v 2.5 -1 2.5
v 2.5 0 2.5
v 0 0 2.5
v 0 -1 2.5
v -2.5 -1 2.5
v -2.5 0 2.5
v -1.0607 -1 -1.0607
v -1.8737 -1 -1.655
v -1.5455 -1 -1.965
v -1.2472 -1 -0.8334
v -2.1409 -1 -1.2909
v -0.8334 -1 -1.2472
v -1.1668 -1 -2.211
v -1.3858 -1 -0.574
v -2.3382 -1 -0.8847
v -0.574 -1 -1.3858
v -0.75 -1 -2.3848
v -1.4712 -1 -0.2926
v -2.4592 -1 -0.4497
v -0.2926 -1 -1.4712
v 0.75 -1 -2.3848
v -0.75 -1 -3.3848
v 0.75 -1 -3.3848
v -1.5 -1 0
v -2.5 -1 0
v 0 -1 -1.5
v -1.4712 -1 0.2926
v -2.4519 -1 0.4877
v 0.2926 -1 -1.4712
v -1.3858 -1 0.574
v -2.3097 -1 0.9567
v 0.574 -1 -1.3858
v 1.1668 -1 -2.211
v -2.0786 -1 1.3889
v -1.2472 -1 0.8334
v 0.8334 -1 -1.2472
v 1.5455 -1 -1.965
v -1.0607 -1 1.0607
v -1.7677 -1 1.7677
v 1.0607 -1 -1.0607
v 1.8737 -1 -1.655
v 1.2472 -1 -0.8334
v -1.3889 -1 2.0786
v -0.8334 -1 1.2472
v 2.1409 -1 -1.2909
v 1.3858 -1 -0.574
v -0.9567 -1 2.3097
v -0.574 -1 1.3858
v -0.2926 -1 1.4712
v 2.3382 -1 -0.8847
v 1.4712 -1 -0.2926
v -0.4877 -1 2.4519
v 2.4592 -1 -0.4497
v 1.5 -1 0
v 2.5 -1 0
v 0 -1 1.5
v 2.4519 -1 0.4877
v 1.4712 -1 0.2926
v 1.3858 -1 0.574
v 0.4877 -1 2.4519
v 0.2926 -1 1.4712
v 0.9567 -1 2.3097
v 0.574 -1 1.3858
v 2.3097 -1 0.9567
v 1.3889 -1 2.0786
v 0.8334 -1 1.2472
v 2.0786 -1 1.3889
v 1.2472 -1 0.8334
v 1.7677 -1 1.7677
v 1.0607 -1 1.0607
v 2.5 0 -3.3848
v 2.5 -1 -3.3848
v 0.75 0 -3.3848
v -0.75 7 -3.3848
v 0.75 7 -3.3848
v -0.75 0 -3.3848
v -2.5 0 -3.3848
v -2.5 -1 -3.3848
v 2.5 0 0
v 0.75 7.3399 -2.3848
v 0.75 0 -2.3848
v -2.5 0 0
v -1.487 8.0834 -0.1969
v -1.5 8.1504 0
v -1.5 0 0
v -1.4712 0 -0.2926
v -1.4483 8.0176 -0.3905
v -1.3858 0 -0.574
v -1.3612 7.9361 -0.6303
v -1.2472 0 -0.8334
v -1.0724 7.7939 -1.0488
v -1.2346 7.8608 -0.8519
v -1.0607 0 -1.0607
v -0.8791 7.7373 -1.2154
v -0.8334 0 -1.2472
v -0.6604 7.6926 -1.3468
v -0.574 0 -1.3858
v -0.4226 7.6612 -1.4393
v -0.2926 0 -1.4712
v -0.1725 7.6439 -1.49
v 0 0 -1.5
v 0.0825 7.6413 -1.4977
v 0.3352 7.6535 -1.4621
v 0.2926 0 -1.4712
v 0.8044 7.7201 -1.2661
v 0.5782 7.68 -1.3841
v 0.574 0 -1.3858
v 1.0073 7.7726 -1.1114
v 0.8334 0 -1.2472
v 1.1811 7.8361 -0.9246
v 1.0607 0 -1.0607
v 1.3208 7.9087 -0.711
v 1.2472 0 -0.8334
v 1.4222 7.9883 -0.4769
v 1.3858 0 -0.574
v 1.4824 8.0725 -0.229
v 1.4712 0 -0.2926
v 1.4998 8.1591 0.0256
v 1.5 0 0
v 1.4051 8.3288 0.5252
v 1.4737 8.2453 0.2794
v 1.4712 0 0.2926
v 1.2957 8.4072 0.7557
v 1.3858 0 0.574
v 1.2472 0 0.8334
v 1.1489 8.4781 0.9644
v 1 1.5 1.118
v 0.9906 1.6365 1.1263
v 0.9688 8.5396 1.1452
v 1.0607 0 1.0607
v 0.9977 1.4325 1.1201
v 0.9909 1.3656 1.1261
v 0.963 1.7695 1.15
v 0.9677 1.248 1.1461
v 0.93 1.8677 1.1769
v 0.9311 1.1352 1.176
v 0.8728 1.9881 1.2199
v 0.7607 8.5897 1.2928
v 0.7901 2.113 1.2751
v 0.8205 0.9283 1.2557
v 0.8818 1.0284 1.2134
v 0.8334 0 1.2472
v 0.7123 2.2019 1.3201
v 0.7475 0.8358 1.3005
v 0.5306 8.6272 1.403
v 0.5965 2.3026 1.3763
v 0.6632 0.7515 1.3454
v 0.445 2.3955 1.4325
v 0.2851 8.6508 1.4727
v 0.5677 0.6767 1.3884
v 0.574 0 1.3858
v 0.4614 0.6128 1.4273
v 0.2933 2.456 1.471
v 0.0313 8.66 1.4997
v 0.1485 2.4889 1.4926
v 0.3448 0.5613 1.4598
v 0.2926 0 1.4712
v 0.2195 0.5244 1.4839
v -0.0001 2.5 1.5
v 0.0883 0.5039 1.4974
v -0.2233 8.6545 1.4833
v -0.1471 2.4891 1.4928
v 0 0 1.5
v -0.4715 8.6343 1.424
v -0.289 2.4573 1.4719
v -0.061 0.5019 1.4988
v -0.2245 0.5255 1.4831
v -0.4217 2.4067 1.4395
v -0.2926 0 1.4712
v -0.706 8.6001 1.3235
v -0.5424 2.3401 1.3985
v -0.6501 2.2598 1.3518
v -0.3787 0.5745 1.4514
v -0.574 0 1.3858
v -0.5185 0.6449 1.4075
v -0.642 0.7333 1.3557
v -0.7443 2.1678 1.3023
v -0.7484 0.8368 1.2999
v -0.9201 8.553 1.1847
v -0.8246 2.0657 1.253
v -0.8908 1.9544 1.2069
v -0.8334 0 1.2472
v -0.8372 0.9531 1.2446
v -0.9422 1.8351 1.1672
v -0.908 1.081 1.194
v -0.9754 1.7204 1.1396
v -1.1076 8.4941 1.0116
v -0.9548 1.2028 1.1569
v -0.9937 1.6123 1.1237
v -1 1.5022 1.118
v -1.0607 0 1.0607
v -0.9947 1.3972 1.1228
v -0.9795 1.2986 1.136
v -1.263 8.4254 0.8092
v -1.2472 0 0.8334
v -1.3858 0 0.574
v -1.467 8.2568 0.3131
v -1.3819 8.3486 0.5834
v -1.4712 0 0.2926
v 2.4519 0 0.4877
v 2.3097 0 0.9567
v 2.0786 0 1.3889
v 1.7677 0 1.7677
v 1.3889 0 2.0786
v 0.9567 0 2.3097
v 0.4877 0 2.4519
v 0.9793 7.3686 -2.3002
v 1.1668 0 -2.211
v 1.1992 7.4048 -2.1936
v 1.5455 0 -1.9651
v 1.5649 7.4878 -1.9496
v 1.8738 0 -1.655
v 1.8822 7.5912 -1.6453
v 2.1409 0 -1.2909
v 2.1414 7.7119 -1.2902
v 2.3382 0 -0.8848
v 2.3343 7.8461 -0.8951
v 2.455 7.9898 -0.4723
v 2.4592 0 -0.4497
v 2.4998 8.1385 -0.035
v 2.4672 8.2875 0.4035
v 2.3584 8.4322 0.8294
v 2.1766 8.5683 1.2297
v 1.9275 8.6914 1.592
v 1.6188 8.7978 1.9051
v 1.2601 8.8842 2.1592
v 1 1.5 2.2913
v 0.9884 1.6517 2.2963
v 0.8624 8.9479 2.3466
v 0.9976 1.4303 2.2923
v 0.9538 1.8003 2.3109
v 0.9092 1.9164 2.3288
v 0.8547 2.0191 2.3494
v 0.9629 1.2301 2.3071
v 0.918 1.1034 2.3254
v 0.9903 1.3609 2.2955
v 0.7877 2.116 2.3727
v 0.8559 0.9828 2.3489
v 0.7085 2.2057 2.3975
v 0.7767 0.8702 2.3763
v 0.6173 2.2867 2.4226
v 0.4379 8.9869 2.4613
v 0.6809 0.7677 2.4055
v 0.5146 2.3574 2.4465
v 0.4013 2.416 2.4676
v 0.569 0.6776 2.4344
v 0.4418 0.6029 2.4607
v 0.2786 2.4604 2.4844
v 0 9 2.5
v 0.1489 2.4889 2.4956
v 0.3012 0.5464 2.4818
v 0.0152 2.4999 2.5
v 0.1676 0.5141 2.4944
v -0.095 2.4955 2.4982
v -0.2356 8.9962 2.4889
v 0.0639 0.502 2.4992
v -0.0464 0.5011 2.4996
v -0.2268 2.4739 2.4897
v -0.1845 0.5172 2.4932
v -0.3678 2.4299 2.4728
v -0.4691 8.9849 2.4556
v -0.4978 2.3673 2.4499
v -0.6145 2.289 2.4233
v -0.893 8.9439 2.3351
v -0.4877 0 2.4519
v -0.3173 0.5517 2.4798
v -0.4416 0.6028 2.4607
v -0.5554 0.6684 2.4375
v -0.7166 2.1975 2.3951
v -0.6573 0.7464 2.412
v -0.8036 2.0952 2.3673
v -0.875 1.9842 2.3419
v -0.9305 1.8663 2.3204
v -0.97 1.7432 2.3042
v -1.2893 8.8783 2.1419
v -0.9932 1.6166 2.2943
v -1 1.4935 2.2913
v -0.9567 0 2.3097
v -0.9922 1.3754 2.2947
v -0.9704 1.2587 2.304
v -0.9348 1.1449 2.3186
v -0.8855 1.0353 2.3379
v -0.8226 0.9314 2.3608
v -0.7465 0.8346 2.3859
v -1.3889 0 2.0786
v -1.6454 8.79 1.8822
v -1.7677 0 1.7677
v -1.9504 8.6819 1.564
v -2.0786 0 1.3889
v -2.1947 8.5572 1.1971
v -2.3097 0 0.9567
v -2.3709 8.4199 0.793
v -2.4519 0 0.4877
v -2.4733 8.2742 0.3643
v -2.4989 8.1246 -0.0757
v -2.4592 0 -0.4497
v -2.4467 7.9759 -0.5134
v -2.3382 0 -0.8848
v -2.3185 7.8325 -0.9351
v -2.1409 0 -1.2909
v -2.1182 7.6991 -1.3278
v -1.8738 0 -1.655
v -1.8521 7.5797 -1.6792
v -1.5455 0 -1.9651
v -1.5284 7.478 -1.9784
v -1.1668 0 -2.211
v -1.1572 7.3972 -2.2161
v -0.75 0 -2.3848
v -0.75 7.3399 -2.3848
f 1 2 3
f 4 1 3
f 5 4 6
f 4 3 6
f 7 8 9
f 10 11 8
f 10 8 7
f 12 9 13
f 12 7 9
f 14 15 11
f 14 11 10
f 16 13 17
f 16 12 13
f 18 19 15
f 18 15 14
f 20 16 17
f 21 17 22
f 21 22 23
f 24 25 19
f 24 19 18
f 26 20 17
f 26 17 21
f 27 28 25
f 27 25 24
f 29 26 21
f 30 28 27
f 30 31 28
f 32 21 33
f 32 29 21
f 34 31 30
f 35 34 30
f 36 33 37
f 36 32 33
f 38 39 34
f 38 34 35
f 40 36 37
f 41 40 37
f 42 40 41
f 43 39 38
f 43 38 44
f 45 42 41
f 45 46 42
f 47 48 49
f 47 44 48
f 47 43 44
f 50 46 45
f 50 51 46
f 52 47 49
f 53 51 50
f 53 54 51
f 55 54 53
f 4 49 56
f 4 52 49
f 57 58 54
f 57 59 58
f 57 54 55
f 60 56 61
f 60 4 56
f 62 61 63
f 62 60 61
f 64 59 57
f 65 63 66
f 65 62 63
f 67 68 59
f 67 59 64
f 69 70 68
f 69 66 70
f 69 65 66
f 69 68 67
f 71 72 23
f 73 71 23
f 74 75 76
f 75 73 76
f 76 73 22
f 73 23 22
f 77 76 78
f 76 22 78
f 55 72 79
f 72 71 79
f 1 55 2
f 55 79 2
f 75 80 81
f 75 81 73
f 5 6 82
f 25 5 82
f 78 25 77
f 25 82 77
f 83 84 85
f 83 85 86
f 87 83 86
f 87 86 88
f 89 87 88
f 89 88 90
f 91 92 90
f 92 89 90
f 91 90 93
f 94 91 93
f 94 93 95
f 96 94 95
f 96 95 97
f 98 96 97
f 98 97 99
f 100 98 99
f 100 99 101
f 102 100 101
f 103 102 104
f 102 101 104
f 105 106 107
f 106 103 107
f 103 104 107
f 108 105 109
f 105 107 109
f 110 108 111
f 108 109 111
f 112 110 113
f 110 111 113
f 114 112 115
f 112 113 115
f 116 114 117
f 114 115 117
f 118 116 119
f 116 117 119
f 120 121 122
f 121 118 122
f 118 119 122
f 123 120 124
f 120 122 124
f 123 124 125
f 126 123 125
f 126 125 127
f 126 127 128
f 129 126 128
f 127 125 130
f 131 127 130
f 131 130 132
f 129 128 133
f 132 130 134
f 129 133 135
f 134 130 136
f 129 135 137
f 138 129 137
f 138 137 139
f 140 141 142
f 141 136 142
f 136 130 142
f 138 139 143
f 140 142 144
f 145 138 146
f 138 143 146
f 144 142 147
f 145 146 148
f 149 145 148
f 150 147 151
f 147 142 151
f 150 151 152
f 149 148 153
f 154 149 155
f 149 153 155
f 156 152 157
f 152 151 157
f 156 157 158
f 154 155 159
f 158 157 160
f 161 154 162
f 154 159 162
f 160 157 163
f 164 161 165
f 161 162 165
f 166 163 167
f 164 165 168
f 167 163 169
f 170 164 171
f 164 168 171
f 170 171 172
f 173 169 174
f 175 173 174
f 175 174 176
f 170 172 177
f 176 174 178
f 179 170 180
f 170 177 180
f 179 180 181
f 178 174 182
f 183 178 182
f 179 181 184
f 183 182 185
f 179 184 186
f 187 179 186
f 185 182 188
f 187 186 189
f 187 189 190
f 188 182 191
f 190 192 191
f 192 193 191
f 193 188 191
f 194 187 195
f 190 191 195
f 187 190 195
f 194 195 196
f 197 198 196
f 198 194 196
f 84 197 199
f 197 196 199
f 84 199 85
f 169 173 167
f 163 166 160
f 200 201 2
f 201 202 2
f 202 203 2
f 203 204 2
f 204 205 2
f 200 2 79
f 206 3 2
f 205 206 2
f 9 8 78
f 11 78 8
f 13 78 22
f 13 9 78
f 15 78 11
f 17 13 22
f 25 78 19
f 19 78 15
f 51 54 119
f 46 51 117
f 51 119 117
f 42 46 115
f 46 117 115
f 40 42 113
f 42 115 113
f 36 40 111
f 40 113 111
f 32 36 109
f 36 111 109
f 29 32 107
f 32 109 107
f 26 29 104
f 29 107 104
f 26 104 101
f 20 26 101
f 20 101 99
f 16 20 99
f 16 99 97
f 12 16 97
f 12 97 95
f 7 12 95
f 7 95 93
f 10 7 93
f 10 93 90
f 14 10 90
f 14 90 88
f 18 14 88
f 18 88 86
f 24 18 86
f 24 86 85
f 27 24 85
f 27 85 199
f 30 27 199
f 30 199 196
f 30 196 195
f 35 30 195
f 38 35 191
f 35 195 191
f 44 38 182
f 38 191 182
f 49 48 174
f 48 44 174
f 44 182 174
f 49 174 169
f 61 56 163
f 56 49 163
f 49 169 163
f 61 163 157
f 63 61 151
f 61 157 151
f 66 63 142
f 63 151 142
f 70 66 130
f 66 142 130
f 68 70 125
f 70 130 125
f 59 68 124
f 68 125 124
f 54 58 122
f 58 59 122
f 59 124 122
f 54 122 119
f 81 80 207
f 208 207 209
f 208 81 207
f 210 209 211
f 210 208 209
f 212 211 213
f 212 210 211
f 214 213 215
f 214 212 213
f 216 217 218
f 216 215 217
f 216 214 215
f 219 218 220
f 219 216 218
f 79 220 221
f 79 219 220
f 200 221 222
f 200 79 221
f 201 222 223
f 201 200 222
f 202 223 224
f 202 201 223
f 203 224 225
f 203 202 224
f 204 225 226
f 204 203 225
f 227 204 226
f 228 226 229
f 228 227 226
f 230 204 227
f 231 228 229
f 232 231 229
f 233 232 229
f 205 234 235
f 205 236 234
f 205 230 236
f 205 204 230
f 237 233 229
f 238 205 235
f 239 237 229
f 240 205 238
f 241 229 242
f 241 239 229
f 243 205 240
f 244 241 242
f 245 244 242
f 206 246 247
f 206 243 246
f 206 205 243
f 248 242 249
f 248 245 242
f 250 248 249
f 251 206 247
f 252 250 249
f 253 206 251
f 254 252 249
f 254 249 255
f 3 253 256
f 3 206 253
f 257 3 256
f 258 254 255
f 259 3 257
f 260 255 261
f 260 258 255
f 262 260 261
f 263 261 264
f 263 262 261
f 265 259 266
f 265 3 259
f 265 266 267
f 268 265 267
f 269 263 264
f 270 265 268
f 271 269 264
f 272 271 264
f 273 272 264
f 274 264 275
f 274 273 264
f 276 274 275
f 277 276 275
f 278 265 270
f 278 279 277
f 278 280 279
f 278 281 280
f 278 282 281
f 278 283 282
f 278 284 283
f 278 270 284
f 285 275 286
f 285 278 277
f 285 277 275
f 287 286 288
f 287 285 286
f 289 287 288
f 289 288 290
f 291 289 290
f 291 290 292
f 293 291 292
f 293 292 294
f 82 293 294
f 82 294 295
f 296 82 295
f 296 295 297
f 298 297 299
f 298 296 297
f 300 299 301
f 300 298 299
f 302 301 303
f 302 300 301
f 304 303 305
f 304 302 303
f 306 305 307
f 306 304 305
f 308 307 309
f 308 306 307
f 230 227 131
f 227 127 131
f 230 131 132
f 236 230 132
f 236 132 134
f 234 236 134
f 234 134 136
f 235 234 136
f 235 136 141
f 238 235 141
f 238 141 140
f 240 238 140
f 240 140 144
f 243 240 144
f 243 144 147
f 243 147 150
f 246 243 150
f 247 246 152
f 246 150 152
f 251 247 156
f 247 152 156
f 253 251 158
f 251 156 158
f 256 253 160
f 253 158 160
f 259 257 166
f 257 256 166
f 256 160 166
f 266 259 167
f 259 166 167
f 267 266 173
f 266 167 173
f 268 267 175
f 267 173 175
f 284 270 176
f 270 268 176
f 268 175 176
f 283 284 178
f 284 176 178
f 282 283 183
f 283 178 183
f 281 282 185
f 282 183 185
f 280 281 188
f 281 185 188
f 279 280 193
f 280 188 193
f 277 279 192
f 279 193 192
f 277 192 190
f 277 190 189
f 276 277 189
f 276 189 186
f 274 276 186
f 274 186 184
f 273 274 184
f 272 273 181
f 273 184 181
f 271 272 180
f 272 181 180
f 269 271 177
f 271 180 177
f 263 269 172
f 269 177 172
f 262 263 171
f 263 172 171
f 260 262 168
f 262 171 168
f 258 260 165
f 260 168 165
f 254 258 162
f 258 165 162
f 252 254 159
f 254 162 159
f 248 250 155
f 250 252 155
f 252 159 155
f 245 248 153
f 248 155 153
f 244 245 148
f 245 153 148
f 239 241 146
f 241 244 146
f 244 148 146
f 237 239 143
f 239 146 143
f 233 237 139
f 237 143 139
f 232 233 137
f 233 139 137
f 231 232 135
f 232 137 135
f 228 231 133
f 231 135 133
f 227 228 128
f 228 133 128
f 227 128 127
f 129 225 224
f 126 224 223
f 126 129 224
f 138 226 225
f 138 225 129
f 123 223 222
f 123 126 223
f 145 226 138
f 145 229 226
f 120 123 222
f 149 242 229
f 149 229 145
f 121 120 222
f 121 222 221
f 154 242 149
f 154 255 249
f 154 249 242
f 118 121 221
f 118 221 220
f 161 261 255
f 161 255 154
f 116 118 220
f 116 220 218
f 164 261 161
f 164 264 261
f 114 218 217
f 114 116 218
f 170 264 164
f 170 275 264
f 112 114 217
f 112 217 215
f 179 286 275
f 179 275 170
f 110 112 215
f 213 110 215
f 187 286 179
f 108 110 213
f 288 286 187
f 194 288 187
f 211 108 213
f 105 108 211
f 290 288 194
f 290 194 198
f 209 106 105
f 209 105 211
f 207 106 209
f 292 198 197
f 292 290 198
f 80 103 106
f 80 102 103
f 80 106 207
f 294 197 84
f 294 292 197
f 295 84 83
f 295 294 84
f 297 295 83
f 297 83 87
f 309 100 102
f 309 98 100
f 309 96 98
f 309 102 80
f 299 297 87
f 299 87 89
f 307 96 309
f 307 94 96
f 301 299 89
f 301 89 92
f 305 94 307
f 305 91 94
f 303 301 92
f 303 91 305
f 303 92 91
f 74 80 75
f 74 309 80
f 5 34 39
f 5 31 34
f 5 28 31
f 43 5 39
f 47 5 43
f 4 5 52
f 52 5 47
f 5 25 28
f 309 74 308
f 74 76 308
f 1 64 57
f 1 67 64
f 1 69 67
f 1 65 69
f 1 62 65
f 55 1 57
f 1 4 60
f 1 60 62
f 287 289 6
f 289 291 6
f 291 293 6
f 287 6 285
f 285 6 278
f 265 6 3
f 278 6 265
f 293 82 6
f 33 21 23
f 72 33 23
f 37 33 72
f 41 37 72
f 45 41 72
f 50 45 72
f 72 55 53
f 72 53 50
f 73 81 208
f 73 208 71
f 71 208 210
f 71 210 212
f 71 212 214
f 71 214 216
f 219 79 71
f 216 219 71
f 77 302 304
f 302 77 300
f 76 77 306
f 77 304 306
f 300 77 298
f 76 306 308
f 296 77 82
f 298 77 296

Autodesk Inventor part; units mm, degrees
ref_plane "YZ Plane" through (0, 0, 0) normal (1, 0, 0) x (0, 1, 0)
ref_plane "XZ Plane" through (0, 0, 0) normal (0, 1, 0) x (-1, 0, 0)
ref_plane "XY Plane" through (0, 0, 0) normal (0, 0, 1) x (1, 0, 0)
sketch "Esquisse1" plane through (0, 0, 0) normal (0, 1, 0) x (-1, 0, 0)
  circle A0 centre (0, 0) radius 2.5
  line L0 (0.75, -2.3848) -> (-0.75, -2.3848)
  line L1 (-0.75, -2.3848) -> (-0.75, -3.3848)
  line L2 (-0.75, -3.3848) -> (0.75, -3.3848)
  line L3 (0.75, -3.3848) -> (0.75, -2.3848)
  circle A1 centre (0, 0) radius 1.5
  dimension "d0" = 5
  dimension "d1" = 1.5
  dimension "d2" = 1
  dimension "d3" = 3
extrude "Extrusion1" add sketch "Esquisse1" along normal blind 9
sketch "Esquisse2" plane through (0, 0, 0) normal (0, -1, 0) x (1, 0, 0)
  circle A0 centre (0, 0) radius 1.5 projected
  line L0 (-0.75, -3.3848) -> (-0.75, -2.3848) projected
  line L1 (0.75, -3.3848) -> (-0.75, -3.3848) projected
  line L2 (0.75, -2.3848) -> (0.75, -3.3848) projected
  arc A1 (0.75, -2.3848) -> (-0.75, -2.3848) centre (0, 0) ccw projected
  line L3 (2.5, 2.5) -> (-2.5, 2.5)
  line L4 (-2.5, 2.5) -> (-2.5, -3.3848)
  line L5 (-2.5, -3.3848) -> (2.5, -3.3848)
  line L6 (2.5, -3.3848) -> (2.5, 2.5)
  arc A2 (0.75, -2.3848) -> (-0.75, -2.3848) centre (0, 0) ccw projected
extrude "Extrusion2" add sketch "Esquisse2" along normal blind 1
sketch "Esquisse3" plane through (0, 0, 0) normal (0, 0, 1) x (1, 0, 0)
  circle A0 centre (0, 1.5) radius 1
  line L0 (1.5, -1) -> (-1.5, -1) projected
  point P0 (0, 0)
  dimension "d8" = 2
  dimension "d9" = 2.5
extrude "Extrusion3" cut sketch "Esquisse3" along normal up to surface
sketch "Esquisse4" plane through (0, 0, 0) normal (1, 0, 0) x (0, 1, 0)
  line L0 (0, 2.5) -> (9, 2.5) projected
  line L1 (9, 2.5) -> (7, -3.3848)
  line L2 (0, -3.3848) -> (9, -3.3848) projected
  line L3 (9, 2.5) -> (9, -3.3848)
  line L4 (7, -3.3848) -> (9, -3.3848)
  point P0 (0, 0)
  dimension "d13" = 2
extrude "Extrusion4" cut sketch "Esquisse4" along normal mid plane 6
properties part number "tige_ejection_douille"
